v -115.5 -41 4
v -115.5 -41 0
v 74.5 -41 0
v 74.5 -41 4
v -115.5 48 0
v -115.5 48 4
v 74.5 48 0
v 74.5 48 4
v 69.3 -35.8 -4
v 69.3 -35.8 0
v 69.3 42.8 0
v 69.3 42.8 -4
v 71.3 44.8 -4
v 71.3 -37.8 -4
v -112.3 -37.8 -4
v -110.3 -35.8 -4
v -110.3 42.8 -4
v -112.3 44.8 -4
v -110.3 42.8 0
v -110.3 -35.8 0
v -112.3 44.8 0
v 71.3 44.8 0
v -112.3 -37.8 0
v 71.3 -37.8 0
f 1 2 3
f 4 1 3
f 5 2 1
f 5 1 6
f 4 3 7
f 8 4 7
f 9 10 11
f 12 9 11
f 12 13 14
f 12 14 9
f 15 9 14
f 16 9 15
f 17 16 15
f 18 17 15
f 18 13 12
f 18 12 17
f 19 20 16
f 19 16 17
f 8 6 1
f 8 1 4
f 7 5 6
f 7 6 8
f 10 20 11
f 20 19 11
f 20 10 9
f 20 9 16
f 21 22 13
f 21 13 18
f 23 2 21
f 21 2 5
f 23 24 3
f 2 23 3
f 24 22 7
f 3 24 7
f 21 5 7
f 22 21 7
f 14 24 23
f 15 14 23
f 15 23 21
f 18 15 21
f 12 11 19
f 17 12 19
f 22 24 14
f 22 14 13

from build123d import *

# Parameters (mm, degrees)
SKETCH1_W           = 190
SKETCH1_H           = 89
BOSS_EXTRUDE1_DEPTH = 4
SKETCH2_W           = 183.6
SKETCH2_H           = 82.6
SKETCH2_W_2         = 179.6
SKETCH2_H_2         = 78.6
BOSS_EXTRUDE2_DEPTH = 4


with BuildPart() as part:
    # Sketch1 → Boss-Extrude1 (new body)
    with BuildSketch(Plane.XY):
        with Locations((-20.5, 3.5)):
            Rectangle(SKETCH1_W, SKETCH1_H)
    extrude(amount=BOSS_EXTRUDE1_DEPTH)

    # Sketch2 → Boss-Extrude2 (add)
    with BuildSketch(Plane(origin=(0, 0, 0), x_dir=(-1, 0, 0), z_dir=(0, 0, -1))):
        with Locations((20.5, 3.5)):
            Rectangle(SKETCH2_W, SKETCH2_H)
        with Locations((20.5, 3.5)):
            Rectangle(SKETCH2_W_2, SKETCH2_H_2, mode=Mode.SUBTRACT)
    extrude(amount=BOSS_EXTRUDE2_DEPTH)


solid = part.part
